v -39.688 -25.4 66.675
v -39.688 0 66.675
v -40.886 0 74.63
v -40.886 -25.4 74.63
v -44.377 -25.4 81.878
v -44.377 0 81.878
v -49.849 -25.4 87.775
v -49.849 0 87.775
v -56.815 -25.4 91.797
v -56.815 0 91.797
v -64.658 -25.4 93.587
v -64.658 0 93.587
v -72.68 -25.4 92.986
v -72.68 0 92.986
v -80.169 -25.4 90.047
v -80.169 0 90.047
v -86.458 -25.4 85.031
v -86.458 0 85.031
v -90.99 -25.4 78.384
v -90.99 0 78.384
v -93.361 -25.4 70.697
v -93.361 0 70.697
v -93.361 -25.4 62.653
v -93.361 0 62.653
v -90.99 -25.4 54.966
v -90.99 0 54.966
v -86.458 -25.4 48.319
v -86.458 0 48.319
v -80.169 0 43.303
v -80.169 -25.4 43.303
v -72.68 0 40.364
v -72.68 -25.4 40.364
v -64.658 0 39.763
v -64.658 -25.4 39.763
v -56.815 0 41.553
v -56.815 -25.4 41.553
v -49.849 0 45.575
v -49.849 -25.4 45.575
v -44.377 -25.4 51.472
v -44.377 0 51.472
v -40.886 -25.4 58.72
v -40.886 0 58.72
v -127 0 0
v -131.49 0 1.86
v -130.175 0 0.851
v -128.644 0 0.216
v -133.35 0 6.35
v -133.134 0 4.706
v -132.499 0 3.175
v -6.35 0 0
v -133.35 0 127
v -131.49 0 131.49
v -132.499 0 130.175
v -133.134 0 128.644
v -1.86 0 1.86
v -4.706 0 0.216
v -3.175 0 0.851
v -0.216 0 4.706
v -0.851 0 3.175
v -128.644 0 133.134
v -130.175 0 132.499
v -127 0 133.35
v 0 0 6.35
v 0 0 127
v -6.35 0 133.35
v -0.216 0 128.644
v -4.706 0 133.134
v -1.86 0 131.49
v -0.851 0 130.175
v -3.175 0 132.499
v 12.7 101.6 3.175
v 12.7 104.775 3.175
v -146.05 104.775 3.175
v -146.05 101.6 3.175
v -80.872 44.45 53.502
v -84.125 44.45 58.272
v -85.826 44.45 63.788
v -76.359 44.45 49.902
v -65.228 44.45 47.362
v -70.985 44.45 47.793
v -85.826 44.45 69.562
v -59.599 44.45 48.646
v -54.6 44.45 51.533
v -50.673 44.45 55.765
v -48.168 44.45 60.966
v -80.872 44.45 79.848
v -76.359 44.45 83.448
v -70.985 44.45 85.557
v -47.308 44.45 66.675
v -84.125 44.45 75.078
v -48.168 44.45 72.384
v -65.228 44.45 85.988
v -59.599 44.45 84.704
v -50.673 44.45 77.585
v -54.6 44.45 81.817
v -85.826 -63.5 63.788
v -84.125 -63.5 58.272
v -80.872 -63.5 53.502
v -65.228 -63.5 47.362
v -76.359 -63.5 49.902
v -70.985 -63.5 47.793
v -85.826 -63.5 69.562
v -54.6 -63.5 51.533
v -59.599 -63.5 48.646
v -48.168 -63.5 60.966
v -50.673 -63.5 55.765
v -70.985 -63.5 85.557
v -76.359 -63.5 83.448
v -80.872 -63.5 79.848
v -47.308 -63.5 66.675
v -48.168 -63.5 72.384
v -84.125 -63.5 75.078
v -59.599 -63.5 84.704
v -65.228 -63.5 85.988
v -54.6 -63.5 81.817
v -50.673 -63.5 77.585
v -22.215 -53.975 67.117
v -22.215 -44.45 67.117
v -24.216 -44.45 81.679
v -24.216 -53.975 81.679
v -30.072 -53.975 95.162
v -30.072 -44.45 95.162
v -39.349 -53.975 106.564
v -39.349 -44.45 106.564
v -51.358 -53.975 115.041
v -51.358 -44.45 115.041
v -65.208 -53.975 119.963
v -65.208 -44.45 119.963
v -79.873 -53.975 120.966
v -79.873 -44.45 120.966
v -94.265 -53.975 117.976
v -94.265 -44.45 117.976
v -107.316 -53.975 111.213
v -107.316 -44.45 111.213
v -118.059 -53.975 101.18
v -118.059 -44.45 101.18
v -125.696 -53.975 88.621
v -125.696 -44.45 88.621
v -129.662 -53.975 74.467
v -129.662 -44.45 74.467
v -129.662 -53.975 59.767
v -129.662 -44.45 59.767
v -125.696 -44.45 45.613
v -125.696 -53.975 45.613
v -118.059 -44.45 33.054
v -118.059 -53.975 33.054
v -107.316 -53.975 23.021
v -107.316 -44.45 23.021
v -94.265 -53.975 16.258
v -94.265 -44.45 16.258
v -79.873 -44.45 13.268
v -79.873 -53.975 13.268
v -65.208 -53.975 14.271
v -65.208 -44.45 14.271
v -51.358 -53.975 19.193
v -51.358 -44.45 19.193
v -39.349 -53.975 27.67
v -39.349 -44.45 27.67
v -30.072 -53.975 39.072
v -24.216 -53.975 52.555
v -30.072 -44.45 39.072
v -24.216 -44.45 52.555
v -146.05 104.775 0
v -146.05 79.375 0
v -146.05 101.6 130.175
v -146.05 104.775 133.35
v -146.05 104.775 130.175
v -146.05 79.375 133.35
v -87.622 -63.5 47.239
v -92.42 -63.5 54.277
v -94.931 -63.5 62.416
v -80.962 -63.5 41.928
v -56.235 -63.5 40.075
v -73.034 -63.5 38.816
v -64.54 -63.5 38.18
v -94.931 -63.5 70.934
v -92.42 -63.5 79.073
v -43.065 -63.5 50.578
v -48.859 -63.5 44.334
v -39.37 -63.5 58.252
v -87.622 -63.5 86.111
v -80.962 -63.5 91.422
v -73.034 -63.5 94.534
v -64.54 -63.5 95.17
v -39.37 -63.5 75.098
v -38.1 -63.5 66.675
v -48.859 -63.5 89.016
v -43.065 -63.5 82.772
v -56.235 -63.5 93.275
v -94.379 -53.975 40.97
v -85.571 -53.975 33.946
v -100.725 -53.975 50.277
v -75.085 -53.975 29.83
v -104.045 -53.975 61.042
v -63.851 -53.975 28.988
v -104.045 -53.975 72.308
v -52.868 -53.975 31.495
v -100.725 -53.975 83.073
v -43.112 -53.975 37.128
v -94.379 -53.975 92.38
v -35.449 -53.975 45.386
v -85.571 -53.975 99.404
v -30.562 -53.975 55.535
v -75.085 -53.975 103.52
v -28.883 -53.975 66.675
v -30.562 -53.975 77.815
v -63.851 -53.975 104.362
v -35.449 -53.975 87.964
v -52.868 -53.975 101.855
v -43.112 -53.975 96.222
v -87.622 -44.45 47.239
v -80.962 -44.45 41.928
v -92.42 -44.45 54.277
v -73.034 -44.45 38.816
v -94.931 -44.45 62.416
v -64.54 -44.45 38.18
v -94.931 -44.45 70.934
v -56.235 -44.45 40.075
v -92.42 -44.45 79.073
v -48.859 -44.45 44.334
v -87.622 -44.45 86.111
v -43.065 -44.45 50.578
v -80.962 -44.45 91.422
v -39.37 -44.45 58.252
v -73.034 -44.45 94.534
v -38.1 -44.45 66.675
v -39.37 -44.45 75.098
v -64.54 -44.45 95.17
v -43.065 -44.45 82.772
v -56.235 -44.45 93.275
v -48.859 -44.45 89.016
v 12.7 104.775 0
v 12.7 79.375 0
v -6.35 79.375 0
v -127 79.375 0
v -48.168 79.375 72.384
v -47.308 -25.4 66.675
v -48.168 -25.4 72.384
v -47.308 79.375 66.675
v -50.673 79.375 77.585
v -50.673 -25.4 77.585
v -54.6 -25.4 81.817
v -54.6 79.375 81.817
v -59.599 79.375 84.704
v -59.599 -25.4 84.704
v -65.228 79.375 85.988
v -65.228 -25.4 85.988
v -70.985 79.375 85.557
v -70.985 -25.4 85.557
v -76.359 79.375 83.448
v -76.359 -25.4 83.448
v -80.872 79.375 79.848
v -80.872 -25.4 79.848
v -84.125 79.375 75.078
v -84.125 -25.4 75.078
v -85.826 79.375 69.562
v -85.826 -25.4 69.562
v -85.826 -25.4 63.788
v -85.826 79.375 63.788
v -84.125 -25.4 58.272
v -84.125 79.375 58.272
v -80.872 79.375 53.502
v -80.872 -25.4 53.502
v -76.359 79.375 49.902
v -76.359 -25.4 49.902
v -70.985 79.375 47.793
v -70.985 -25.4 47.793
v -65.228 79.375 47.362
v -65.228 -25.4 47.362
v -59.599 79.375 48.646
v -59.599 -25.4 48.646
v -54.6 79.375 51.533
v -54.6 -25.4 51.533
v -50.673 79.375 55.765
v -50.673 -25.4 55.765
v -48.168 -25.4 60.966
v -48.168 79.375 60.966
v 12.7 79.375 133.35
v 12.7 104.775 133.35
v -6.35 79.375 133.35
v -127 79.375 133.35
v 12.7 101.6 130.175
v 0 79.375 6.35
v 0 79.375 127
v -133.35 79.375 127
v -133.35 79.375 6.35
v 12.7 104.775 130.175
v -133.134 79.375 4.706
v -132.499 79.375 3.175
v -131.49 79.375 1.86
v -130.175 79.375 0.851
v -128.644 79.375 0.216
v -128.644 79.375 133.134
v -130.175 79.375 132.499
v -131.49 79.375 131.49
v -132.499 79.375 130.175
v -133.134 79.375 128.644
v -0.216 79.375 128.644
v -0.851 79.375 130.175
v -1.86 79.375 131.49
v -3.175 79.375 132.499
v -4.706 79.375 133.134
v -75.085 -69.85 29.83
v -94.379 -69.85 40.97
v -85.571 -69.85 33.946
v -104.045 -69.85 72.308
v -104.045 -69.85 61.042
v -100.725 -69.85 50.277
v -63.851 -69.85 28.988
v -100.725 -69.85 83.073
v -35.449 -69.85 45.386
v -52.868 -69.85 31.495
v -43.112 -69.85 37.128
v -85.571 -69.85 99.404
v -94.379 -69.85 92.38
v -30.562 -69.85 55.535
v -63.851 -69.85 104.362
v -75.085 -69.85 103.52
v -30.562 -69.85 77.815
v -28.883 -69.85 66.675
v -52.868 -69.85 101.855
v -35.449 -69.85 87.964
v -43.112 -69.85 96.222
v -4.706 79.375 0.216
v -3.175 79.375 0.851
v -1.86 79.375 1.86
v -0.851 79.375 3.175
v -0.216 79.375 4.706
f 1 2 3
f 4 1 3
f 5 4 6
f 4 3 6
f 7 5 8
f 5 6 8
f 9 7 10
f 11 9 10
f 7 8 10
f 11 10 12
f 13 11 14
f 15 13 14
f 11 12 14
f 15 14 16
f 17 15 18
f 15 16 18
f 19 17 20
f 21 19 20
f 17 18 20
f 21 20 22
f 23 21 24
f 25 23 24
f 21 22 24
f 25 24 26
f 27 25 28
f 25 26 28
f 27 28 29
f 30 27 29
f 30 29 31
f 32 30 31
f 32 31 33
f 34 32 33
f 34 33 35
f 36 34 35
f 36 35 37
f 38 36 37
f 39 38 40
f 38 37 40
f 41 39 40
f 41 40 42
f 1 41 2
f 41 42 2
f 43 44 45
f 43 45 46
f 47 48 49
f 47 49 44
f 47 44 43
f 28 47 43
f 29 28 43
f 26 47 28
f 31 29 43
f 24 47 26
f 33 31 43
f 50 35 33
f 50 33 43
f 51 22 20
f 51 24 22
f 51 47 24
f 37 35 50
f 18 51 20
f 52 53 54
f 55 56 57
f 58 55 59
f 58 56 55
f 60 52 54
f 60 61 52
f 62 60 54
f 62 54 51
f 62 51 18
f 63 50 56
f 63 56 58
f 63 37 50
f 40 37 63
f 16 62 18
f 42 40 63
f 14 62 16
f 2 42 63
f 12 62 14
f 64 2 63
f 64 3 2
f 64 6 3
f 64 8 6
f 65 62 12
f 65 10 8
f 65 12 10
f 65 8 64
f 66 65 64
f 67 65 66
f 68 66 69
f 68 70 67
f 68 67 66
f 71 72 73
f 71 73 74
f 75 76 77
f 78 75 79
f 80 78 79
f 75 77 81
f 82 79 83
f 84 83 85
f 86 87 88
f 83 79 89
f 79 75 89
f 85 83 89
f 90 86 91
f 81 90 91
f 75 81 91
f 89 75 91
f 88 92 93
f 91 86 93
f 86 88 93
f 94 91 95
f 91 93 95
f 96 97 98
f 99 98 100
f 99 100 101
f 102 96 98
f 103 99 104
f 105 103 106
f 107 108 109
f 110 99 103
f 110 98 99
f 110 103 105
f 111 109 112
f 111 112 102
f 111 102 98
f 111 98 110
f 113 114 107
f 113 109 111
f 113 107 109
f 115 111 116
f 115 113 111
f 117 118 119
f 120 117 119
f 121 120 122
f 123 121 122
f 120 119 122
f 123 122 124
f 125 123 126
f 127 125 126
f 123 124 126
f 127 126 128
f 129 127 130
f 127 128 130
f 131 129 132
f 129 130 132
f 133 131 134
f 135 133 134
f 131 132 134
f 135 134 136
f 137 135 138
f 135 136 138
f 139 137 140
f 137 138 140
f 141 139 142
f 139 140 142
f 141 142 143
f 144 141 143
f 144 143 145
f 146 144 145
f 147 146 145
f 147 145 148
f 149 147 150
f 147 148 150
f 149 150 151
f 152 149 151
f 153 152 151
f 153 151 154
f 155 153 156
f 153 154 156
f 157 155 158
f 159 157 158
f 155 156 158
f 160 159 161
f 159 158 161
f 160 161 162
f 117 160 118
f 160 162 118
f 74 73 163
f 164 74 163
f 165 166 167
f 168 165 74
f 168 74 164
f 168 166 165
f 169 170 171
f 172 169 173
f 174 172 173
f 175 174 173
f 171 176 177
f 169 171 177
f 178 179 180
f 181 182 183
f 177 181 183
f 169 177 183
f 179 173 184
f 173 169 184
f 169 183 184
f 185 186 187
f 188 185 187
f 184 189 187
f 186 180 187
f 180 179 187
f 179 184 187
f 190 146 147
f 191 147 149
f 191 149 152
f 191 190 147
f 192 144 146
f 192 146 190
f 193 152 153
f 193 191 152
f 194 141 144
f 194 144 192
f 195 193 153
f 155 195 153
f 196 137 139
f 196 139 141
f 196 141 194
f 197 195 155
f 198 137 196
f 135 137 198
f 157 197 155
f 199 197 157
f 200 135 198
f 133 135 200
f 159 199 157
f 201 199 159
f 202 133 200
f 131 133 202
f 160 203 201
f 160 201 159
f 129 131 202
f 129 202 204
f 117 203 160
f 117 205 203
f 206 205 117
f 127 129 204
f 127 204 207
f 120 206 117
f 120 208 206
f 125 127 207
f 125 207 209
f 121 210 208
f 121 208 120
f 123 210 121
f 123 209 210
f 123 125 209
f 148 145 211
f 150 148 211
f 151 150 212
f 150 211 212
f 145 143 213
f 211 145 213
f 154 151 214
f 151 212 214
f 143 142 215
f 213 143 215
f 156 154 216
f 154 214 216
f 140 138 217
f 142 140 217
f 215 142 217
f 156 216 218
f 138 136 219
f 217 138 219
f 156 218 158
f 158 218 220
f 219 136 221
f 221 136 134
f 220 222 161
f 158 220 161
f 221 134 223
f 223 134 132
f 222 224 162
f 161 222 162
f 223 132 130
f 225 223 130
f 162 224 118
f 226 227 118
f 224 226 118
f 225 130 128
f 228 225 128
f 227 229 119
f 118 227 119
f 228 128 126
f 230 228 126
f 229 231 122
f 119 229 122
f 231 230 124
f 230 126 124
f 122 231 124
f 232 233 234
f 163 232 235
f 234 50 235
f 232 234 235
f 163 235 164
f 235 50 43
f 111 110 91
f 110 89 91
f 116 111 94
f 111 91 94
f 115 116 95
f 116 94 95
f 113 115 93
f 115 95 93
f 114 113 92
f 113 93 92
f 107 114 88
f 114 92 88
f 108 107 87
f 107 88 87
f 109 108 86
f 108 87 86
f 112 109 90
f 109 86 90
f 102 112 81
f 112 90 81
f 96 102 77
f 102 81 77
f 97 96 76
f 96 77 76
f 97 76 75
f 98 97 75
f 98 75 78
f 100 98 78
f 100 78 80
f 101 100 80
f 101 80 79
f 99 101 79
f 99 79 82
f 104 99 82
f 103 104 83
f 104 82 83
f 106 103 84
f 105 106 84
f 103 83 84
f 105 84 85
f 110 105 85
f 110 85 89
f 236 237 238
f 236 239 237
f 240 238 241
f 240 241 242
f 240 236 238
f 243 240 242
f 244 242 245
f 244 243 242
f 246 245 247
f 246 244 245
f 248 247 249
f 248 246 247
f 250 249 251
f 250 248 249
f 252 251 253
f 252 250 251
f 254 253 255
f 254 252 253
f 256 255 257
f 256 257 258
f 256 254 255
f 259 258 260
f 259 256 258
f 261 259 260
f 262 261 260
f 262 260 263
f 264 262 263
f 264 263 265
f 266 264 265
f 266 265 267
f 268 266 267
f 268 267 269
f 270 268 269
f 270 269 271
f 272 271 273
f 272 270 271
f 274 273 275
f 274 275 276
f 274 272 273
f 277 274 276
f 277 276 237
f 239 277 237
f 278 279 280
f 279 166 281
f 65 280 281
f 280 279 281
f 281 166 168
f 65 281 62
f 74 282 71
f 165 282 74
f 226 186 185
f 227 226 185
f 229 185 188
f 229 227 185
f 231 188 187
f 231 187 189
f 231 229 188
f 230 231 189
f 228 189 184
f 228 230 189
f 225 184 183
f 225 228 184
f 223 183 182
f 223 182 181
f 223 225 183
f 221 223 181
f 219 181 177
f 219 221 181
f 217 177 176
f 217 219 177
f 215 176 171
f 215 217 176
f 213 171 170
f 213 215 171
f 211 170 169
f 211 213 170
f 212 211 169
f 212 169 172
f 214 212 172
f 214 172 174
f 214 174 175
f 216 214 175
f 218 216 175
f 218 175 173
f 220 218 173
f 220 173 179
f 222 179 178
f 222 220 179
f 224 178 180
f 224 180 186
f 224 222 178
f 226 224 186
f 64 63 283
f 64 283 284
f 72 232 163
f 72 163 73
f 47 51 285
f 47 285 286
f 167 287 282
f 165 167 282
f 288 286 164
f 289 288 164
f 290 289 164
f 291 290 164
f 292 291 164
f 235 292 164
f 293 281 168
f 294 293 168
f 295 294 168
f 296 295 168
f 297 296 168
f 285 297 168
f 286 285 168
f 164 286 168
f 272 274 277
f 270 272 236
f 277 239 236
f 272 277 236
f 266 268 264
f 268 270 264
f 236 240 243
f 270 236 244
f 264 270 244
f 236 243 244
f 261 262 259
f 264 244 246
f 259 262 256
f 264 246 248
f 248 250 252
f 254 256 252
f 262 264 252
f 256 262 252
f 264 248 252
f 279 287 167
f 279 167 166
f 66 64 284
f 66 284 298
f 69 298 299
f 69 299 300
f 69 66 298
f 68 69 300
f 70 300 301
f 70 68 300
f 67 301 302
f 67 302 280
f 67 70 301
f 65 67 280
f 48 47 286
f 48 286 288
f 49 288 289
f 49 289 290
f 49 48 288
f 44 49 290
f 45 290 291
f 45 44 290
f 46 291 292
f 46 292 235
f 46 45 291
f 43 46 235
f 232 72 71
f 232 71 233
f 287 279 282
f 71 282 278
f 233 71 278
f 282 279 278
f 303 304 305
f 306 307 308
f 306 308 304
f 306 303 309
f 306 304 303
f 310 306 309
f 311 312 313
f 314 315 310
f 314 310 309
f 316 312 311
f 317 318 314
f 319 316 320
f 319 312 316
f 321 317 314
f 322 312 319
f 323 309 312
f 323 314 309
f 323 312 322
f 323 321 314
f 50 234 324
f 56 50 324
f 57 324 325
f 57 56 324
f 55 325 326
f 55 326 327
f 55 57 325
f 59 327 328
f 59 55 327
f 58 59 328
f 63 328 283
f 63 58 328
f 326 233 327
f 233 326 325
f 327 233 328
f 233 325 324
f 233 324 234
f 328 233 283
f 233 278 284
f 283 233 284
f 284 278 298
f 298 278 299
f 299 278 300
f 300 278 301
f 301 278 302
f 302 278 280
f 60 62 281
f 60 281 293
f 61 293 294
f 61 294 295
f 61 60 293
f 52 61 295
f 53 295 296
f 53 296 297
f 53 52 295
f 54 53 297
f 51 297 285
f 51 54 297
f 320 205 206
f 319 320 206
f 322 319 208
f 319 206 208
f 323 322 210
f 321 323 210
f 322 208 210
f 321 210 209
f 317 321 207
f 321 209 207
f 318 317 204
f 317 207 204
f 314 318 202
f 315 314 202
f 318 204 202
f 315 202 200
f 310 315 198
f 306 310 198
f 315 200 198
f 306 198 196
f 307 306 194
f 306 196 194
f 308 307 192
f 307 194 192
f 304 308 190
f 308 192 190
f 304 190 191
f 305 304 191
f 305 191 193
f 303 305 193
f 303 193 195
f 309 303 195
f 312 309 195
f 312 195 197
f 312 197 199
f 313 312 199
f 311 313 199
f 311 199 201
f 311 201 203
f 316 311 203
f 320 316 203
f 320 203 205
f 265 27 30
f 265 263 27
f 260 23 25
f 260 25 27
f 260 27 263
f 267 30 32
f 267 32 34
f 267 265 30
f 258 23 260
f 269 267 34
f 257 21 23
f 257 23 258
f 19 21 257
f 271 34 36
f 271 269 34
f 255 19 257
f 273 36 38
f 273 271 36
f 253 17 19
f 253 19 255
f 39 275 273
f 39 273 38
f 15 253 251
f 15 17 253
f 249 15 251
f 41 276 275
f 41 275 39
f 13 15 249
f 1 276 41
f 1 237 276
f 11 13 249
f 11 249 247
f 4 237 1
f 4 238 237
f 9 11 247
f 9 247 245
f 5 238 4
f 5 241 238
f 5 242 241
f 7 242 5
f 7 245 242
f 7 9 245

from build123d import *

# Parameters (mm, degrees)
F0_R      = 26.9875
F0_R_2    = 19.3675
F1_DEPTH  = 25.4
F2_DEPTH  = 79.375
F3_DEPTH  = 44.45
F4_R      = 37.792391803
F4_R_2    = 28.575
F4_R_3    = 19.3675
F5_DEPTH  = 25.4
F4_R_4    = 53.975
F6_DEPTH  = 9.525
F7_DEPTH  = 19.05
F8_DEPTH  = 19.05
F9_R      = 19.3675
F10_DEPTH = 22.225
F11_W     = 3.175
F11_H     = 3.175
F12_DEPTH = 158.75


with BuildPart() as f1:
    # F0 (on Front) → F1 (new body)
    with BuildSketch(Plane.XZ):
        with Locations((-66.675, 66.675)):
            Circle(F0_R)
        with Locations((-66.675, 66.675)):
            Circle(F0_R_2, mode=Mode.SUBTRACT)
    extrude(amount=F1_DEPTH)

    # F0 (on Front) → F2 (join)
    with BuildSketch(Plane.XZ):
        with BuildLine():
            Line((-127, 0), (-6.35, 0))
            ThreePointArc((-6.35, 0), (-1.8598719395, 1.8598719395), (0, 6.35))
            Line((0, 6.35), (0, 127))
            ThreePointArc((0, 127), (-1.8598719395, 131.4901280605), (-6.35, 133.35))
            Line((-6.35, 133.35), (-127, 133.35))
            ThreePointArc((-127, 133.35), (-131.4901280605, 131.4901280605), (-133.35, 127))
            Line((-133.35, 127), (-133.35, 6.35))
            ThreePointArc((-133.35, 6.35), (-131.4901280605, 1.8598719395), (-127, 0))
        make_face()
        with Locations((-66.675, 66.675)):
            Circle(F0_R, mode=Mode.SUBTRACT)
        with Locations((-66.675, 66.675)):
            Circle(F0_R)
        with Locations((-66.675, 66.675)):
            Circle(F0_R_2, mode=Mode.SUBTRACT)
    extrude(amount=-F2_DEPTH)

    # F9 (on face) → F10 (join)
    with BuildSketch(Plane(origin=(0, 79.375, 0), x_dir=(-1, 0, 0), z_dir=(0, 1, 0))):
        with BuildLine():
            Line((6.35, 133.35), (-12.7, 133.35))
            Line((-12.7, 133.35), (-12.7, 0))
            Line((-12.7, 0), (6.35, 0))
            ThreePointArc((6.35, 0), (1.8598719395, 1.8598719395), (0, 6.35))
            Line((0, 6.35), (0, 127))
            ThreePointArc((0, 127), (1.8598719395, 131.4901280605), (6.35, 133.35))
        make_face()
        with BuildLine():
            Line((127, 133.35), (6.35, 133.35))
            ThreePointArc((6.35, 133.35), (1.8598719395, 131.4901280605), (0, 127))
            Line((0, 127), (0, 6.35))
            ThreePointArc((0, 6.35), (1.8598719395, 1.8598719395), (6.35, 0))
            Line((6.35, 0), (127, 0))
            ThreePointArc((127, 0), (131.4901280605, 1.8598719395), (133.35, 6.35))
            Line((133.35, 6.35), (133.35, 127))
            ThreePointArc((133.35, 127), (131.4901280605, 131.4901280605), (127, 133.35))
        make_face()
        with Locations((66.675, 66.675)):
            Circle(F9_R, mode=Mode.SUBTRACT)
        with BuildLine():
            Line((146.05, 133.35), (127, 133.35))
            ThreePointArc((127, 133.35), (131.4901280605, 131.4901280605), (133.35, 127))
            Line((133.35, 127), (133.35, 6.35))
            ThreePointArc((133.35, 6.35), (131.4901280605, 1.8598719395), (127, 0))
            Line((127, 0), (146.05, 0))
            Line((146.05, 0), (146.05, 133.35))
        make_face()
        with Locations((66.675, 66.675)):
            Circle(F9_R)
    extrude(amount=F10_DEPTH)

    # F11 (on face) → F12 (join)
    with BuildSketch(Plane(origin=(-146.05, 0, 0), x_dir=(0, -1, 0), z_dir=(-1, 0, 0))):
        with Locations((-103.1875, 131.7625)):
            Rectangle(F11_W, F11_H)
        with Locations((-103.1875, 1.5875)):
            Rectangle(F11_W, F11_H)
    extrude(amount=-F12_DEPTH)


with BuildPart() as f3:
    # F0 (on Front) → F3 (new body, symmetric)
    with BuildSketch(Plane.XZ):
        with Locations((-66.675, 66.675)):
            Circle(F0_R_2)
    extrude(amount=F3_DEPTH, both=True)

    # F4 (on face) → F8 (join)
    with BuildSketch(Plane.XZ.offset(44.45)):
        with Locations((-66.675, 66.675)):
            Circle(F4_R_3)
    extrude(amount=F8_DEPTH)


with BuildPart() as f5:
    # F4 (on face) → F5 (new body)
    with BuildSketch(Plane.XZ.offset(44.45)):
        with Locations((-66.675, 66.675)):
            Circle(F4_R)
        with Locations((-66.675, 66.675)):
            Circle(F4_R_2, mode=Mode.SUBTRACT)
        with Locations((-66.675, 66.675)):
            Circle(F4_R_2)
        with Locations((-66.675, 66.675)):
            Circle(F4_R_3, mode=Mode.SUBTRACT)
        with Locations((-66.675, 66.675)):
            Circle(F4_R_3)
    extrude(amount=F5_DEPTH)

    # F4 (on face) → F6 (join)
    with BuildSketch(Plane.XZ.offset(44.45)):
        with Locations((-76.1897387261, 67.1170090193)):
            Circle(F4_R_4)
        with Locations((-66.675, 66.675)):
            Circle(F4_R, mode=Mode.SUBTRACT)
    extrude(amount=F6_DEPTH)

    # F4 (on face) → F7 (cut)
    with BuildSketch(Plane.XZ.offset(44.45)):
        with Locations((-66.675, 66.675)):
            Circle(F4_R_2)
        with Locations((-66.675, 66.675)):
            Circle(F4_R_3, mode=Mode.SUBTRACT)
        with Locations((-66.675, 66.675)):
            Circle(F4_R_3)
    extrude(amount=F7_DEPTH, mode=Mode.SUBTRACT)


solid = Compound([f1.part, f3.part, f5.part])
